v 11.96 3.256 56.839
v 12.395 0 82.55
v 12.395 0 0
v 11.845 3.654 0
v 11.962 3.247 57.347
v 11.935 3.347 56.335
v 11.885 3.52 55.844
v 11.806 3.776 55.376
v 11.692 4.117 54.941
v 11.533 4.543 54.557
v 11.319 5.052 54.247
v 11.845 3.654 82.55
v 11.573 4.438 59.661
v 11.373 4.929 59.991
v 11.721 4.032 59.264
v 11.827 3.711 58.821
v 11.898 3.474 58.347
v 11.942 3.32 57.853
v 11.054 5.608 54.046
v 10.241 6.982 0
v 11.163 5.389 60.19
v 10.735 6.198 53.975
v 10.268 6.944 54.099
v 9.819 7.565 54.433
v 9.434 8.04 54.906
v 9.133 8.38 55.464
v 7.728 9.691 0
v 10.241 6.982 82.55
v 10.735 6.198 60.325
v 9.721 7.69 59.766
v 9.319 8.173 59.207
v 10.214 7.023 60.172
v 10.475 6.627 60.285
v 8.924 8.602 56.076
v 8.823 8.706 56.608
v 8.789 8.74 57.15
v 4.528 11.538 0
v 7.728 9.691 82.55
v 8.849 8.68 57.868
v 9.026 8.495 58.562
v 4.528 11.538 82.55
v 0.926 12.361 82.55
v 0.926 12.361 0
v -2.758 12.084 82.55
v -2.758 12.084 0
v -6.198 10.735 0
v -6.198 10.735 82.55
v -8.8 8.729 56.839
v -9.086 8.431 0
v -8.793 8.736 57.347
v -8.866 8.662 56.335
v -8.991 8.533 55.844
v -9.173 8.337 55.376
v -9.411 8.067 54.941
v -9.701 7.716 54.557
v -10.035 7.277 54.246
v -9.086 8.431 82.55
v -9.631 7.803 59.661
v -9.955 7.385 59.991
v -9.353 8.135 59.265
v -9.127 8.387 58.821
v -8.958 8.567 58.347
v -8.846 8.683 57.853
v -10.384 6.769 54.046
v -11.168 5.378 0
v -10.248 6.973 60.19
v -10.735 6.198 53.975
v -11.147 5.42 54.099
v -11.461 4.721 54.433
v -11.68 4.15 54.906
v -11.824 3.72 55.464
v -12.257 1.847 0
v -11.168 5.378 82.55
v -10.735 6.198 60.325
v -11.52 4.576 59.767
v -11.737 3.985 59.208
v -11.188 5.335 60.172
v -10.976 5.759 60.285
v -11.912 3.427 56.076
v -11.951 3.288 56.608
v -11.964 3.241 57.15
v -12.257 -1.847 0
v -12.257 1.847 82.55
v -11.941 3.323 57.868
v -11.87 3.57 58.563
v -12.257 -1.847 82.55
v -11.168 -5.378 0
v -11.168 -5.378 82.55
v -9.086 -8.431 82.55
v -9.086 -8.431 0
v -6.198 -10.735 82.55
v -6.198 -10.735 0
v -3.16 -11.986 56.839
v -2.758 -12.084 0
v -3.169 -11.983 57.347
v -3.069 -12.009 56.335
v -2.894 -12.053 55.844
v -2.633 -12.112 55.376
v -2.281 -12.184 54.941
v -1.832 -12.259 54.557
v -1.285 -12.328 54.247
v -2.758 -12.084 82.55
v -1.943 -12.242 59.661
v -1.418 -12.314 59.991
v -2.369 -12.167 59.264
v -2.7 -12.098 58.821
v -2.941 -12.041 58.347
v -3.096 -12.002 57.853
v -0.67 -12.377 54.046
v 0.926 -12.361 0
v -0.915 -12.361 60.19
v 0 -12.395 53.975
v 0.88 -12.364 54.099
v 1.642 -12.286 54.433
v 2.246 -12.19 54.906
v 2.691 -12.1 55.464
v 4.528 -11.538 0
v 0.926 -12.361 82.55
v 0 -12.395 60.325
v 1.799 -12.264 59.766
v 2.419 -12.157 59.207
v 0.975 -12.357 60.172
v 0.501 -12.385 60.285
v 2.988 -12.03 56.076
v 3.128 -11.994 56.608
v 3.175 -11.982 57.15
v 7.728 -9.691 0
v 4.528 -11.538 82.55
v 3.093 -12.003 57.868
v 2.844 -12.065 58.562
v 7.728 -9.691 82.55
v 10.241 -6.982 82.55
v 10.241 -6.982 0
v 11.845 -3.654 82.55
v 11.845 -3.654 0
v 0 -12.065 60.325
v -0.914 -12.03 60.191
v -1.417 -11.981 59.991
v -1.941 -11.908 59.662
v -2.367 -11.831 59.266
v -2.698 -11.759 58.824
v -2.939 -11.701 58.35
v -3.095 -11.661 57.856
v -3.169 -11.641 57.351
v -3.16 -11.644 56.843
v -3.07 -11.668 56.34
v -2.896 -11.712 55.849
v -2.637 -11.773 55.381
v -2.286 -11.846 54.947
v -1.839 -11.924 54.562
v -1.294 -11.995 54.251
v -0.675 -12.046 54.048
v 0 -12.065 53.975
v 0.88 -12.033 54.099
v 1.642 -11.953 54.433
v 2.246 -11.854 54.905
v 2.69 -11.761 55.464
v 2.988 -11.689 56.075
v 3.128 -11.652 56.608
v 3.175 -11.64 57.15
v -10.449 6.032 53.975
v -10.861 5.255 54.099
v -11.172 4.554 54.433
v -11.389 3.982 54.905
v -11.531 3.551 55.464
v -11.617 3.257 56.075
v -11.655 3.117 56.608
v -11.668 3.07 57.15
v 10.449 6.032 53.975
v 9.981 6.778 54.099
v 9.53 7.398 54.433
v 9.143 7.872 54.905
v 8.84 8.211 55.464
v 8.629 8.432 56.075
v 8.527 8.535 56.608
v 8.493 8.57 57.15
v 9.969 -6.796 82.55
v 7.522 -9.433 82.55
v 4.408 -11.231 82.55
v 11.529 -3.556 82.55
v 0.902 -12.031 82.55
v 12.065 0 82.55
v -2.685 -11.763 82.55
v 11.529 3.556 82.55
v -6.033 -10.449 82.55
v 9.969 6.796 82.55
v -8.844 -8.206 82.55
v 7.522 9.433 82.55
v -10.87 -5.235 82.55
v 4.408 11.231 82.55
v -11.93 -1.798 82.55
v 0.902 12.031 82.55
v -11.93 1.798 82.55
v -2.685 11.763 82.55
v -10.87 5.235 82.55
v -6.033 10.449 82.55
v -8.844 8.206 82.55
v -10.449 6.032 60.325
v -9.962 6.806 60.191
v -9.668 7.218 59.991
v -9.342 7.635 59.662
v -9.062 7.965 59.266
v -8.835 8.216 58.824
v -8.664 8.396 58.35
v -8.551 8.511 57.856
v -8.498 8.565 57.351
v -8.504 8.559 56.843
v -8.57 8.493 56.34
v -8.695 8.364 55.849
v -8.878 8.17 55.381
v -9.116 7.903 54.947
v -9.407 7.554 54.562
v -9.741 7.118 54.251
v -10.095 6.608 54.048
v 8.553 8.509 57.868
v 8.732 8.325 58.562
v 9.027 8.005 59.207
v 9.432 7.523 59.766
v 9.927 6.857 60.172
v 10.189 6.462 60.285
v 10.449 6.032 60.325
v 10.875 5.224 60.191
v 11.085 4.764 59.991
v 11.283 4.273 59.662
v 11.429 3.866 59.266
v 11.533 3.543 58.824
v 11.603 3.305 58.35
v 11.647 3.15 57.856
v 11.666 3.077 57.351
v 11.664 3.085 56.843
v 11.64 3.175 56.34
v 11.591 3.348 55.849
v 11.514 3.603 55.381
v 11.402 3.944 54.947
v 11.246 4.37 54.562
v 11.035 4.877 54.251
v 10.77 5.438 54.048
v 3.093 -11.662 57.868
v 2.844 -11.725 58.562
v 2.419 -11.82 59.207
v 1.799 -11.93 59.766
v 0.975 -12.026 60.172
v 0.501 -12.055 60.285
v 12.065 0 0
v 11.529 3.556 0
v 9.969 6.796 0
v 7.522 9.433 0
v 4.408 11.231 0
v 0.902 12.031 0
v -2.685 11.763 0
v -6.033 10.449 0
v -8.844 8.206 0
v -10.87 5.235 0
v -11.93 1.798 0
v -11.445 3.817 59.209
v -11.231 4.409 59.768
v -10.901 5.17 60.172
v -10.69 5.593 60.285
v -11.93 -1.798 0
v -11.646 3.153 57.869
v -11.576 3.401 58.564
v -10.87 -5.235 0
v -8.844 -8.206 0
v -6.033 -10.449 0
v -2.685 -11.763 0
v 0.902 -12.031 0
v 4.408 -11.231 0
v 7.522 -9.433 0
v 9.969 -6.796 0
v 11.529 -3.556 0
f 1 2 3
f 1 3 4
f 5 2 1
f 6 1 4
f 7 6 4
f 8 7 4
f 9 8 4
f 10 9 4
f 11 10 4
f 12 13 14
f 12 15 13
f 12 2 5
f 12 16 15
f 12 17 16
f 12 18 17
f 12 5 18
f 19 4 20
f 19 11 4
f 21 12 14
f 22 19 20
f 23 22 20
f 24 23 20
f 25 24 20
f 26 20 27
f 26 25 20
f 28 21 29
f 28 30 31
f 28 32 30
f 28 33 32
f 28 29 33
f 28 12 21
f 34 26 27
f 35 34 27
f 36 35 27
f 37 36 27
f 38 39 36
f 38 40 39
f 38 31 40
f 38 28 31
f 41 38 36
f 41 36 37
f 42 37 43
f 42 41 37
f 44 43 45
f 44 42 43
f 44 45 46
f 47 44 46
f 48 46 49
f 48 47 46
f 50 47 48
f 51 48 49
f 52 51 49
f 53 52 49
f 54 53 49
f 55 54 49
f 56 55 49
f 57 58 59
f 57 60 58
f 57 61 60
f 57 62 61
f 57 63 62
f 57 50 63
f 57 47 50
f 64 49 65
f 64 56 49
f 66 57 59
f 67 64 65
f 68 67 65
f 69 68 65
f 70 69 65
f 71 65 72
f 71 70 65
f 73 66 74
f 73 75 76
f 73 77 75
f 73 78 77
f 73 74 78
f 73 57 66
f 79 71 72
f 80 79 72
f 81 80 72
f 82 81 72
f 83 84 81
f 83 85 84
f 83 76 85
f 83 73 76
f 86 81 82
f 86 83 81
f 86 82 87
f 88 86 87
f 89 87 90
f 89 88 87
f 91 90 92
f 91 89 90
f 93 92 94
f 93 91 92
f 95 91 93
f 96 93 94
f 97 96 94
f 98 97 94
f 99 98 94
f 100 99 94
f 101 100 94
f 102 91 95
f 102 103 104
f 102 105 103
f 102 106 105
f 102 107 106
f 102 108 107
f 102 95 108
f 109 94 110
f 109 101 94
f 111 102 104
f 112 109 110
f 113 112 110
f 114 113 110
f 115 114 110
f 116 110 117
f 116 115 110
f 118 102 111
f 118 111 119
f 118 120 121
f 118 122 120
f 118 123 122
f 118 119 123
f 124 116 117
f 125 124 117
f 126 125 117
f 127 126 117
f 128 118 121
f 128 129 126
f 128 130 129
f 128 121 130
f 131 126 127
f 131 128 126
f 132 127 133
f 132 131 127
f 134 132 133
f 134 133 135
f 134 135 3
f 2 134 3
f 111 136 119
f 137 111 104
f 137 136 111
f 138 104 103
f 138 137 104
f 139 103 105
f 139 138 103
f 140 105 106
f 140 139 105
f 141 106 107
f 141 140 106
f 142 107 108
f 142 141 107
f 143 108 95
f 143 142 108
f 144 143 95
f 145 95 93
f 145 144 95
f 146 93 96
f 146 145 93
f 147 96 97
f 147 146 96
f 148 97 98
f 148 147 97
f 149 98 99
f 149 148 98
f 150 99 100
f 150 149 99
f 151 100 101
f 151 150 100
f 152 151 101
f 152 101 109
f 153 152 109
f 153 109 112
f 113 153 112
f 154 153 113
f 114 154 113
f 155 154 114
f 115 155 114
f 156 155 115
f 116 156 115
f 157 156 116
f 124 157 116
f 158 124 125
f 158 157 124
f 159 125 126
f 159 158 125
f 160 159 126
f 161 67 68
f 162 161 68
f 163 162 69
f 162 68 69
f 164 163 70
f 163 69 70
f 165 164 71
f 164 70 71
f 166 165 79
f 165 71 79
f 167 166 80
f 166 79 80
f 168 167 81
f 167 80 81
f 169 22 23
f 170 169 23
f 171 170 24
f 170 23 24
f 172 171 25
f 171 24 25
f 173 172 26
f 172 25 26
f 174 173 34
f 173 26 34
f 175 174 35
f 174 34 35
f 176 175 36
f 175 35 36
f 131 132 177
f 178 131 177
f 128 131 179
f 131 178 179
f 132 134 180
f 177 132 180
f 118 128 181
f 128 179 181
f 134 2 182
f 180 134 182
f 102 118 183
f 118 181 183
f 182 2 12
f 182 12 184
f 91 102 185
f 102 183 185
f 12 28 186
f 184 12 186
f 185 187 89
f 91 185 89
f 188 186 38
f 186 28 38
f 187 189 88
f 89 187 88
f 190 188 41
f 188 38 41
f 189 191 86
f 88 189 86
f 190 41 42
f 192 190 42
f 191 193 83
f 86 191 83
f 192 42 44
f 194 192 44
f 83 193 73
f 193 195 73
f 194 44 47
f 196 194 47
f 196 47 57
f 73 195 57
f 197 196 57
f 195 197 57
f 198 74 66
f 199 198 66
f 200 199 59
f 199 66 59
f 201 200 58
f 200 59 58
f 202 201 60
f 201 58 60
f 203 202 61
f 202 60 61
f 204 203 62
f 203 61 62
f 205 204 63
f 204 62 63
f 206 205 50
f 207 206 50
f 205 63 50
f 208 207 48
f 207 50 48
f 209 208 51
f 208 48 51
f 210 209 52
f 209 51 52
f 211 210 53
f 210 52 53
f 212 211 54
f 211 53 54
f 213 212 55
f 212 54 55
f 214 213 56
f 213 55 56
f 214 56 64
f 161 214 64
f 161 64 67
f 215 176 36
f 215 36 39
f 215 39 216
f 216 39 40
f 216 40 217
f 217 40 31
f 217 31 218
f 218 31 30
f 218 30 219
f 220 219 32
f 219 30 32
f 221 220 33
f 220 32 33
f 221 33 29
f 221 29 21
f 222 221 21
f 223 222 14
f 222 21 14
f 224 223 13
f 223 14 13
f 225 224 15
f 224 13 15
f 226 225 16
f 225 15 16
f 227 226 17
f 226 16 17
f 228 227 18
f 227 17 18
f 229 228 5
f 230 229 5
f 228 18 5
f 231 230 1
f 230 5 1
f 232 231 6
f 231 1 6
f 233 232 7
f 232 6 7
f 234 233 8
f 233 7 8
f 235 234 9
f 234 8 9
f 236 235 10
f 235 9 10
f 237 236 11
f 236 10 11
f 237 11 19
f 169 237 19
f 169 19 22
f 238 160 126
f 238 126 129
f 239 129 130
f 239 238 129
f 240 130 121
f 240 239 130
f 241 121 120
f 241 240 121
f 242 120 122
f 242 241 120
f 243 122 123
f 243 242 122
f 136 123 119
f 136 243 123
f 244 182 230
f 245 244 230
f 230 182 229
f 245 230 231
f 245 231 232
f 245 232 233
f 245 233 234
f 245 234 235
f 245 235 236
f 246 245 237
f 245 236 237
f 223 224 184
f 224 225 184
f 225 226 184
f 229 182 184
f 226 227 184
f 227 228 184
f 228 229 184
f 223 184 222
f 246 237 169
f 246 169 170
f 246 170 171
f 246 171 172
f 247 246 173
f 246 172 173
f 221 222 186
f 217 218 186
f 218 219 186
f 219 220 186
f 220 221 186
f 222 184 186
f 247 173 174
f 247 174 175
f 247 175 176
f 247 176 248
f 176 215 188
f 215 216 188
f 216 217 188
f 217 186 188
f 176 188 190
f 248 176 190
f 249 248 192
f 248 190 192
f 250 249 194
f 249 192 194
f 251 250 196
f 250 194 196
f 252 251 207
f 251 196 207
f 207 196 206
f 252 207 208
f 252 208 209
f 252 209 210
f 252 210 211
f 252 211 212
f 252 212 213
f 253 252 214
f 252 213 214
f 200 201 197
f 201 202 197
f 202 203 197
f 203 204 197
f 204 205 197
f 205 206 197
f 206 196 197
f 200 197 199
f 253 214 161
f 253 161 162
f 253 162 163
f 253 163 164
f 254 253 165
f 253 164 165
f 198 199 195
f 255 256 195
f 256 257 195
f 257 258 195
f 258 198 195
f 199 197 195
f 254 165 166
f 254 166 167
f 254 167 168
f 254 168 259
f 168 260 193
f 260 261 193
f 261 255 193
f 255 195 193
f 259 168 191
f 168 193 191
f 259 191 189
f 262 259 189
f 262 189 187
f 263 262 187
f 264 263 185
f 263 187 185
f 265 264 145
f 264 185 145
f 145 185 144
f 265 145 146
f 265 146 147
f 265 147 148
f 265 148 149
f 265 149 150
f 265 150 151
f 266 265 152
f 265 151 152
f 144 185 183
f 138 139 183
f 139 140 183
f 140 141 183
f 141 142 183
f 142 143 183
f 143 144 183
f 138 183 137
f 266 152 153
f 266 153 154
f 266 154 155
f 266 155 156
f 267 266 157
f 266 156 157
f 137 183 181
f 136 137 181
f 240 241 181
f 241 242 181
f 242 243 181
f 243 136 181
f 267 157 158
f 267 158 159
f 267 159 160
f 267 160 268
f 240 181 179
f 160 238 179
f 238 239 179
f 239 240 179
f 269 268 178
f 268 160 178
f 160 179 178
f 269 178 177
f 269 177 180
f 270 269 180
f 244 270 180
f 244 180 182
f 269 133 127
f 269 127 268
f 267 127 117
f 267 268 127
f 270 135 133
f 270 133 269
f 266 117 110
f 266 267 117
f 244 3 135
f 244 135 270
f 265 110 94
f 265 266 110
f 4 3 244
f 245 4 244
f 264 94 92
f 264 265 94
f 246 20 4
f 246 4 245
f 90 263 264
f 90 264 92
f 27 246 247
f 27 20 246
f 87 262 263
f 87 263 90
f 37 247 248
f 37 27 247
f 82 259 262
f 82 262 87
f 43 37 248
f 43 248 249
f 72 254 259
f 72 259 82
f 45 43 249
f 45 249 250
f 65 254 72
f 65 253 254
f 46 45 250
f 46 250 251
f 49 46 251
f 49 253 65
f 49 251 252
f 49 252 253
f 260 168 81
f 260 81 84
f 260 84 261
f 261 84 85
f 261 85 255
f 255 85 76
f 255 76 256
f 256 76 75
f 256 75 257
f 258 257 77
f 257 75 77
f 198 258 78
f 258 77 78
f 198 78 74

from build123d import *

# Parameters (mm, degrees)
F0_W      = 0.3302
F0_H      = 82.55
F3_DEPTH  = 12.3962
F7_DEPTH  = 1.7554578348
F10_DEPTH = 1.7554578348


with BuildPart() as f1:
    # F0 (on Front) → F1 (revolve)
    with BuildSketch(Plane.XZ):
        with Locations((12.2301, 41.275)):
            Rectangle(F0_W, F0_H)
    revolve(axis=Axis((0, 0, 41.275), (0, 0, 1)))

    # F2 (on Front) → F3 (cut, through all)
    with BuildSketch(Plane.XZ):
        with BuildLine():
            ThreePointArc((0, 60.325), (-3.175, 57.15), (0, 53.975))
            Line((0, 53.975), (0, 60.325))
        make_face()
        with BuildLine():
            Line((0, 60.325), (0, 53.975))
            ThreePointArc((0, 53.975), (2.2450640303, 54.9049359697), (3.175, 57.15))
            ThreePointArc((3.175, 57.15), (2.2450640303, 59.3950640303), (0, 60.325))
        make_face()
    extrude(amount=F3_DEPTH, mode=Mode.SUBTRACT)

    # F6 (on line) → F7 (cut, up to face)
    with BuildSketch(Plane(origin=(10.734558085, 6.1976, 0), x_dir=(-0.5, 0.8660254038, 0), z_dir=(0.8660254038, 0.5, 0))):
        with BuildLine():
            ThreePointArc((0, 60.325), (-3.175, 57.15), (0, 53.975))
            Line((0, 53.975), (0, 60.325))
        make_face()
        with BuildLine():
            Line((0, 60.325), (0, 53.975))
            ThreePointArc((0, 53.975), (2.2450640303, 54.9049359697), (3.175, 57.15))
            ThreePointArc((3.175, 57.15), (2.2450640303, 59.3950640303), (0, 60.325))
        make_face()
    extrude(amount=-F7_DEPTH, mode=Mode.SUBTRACT)

    # F9 (on line) → F10 (cut, up to face)
    with BuildSketch(Plane(origin=(-10.734558085, 6.1976, 0), x_dir=(-0.5, -0.8660254038, 0), z_dir=(-0.8660254038, 0.5, 0))):
        with BuildLine():
            ThreePointArc((0, 60.325), (-3.175, 57.15), (0, 53.975))
            Line((0, 53.975), (0, 60.325))
        make_face()
        with BuildLine():
            Line((0, 60.325), (0, 53.975))
            ThreePointArc((0, 53.975), (2.2450640303, 54.9049359697), (3.175, 57.15))
            ThreePointArc((3.175, 57.15), (2.2450640303, 59.3950640303), (0, 60.325))
        make_face()
    extrude(amount=-F10_DEPTH, mode=Mode.SUBTRACT)


solid = f1.part
